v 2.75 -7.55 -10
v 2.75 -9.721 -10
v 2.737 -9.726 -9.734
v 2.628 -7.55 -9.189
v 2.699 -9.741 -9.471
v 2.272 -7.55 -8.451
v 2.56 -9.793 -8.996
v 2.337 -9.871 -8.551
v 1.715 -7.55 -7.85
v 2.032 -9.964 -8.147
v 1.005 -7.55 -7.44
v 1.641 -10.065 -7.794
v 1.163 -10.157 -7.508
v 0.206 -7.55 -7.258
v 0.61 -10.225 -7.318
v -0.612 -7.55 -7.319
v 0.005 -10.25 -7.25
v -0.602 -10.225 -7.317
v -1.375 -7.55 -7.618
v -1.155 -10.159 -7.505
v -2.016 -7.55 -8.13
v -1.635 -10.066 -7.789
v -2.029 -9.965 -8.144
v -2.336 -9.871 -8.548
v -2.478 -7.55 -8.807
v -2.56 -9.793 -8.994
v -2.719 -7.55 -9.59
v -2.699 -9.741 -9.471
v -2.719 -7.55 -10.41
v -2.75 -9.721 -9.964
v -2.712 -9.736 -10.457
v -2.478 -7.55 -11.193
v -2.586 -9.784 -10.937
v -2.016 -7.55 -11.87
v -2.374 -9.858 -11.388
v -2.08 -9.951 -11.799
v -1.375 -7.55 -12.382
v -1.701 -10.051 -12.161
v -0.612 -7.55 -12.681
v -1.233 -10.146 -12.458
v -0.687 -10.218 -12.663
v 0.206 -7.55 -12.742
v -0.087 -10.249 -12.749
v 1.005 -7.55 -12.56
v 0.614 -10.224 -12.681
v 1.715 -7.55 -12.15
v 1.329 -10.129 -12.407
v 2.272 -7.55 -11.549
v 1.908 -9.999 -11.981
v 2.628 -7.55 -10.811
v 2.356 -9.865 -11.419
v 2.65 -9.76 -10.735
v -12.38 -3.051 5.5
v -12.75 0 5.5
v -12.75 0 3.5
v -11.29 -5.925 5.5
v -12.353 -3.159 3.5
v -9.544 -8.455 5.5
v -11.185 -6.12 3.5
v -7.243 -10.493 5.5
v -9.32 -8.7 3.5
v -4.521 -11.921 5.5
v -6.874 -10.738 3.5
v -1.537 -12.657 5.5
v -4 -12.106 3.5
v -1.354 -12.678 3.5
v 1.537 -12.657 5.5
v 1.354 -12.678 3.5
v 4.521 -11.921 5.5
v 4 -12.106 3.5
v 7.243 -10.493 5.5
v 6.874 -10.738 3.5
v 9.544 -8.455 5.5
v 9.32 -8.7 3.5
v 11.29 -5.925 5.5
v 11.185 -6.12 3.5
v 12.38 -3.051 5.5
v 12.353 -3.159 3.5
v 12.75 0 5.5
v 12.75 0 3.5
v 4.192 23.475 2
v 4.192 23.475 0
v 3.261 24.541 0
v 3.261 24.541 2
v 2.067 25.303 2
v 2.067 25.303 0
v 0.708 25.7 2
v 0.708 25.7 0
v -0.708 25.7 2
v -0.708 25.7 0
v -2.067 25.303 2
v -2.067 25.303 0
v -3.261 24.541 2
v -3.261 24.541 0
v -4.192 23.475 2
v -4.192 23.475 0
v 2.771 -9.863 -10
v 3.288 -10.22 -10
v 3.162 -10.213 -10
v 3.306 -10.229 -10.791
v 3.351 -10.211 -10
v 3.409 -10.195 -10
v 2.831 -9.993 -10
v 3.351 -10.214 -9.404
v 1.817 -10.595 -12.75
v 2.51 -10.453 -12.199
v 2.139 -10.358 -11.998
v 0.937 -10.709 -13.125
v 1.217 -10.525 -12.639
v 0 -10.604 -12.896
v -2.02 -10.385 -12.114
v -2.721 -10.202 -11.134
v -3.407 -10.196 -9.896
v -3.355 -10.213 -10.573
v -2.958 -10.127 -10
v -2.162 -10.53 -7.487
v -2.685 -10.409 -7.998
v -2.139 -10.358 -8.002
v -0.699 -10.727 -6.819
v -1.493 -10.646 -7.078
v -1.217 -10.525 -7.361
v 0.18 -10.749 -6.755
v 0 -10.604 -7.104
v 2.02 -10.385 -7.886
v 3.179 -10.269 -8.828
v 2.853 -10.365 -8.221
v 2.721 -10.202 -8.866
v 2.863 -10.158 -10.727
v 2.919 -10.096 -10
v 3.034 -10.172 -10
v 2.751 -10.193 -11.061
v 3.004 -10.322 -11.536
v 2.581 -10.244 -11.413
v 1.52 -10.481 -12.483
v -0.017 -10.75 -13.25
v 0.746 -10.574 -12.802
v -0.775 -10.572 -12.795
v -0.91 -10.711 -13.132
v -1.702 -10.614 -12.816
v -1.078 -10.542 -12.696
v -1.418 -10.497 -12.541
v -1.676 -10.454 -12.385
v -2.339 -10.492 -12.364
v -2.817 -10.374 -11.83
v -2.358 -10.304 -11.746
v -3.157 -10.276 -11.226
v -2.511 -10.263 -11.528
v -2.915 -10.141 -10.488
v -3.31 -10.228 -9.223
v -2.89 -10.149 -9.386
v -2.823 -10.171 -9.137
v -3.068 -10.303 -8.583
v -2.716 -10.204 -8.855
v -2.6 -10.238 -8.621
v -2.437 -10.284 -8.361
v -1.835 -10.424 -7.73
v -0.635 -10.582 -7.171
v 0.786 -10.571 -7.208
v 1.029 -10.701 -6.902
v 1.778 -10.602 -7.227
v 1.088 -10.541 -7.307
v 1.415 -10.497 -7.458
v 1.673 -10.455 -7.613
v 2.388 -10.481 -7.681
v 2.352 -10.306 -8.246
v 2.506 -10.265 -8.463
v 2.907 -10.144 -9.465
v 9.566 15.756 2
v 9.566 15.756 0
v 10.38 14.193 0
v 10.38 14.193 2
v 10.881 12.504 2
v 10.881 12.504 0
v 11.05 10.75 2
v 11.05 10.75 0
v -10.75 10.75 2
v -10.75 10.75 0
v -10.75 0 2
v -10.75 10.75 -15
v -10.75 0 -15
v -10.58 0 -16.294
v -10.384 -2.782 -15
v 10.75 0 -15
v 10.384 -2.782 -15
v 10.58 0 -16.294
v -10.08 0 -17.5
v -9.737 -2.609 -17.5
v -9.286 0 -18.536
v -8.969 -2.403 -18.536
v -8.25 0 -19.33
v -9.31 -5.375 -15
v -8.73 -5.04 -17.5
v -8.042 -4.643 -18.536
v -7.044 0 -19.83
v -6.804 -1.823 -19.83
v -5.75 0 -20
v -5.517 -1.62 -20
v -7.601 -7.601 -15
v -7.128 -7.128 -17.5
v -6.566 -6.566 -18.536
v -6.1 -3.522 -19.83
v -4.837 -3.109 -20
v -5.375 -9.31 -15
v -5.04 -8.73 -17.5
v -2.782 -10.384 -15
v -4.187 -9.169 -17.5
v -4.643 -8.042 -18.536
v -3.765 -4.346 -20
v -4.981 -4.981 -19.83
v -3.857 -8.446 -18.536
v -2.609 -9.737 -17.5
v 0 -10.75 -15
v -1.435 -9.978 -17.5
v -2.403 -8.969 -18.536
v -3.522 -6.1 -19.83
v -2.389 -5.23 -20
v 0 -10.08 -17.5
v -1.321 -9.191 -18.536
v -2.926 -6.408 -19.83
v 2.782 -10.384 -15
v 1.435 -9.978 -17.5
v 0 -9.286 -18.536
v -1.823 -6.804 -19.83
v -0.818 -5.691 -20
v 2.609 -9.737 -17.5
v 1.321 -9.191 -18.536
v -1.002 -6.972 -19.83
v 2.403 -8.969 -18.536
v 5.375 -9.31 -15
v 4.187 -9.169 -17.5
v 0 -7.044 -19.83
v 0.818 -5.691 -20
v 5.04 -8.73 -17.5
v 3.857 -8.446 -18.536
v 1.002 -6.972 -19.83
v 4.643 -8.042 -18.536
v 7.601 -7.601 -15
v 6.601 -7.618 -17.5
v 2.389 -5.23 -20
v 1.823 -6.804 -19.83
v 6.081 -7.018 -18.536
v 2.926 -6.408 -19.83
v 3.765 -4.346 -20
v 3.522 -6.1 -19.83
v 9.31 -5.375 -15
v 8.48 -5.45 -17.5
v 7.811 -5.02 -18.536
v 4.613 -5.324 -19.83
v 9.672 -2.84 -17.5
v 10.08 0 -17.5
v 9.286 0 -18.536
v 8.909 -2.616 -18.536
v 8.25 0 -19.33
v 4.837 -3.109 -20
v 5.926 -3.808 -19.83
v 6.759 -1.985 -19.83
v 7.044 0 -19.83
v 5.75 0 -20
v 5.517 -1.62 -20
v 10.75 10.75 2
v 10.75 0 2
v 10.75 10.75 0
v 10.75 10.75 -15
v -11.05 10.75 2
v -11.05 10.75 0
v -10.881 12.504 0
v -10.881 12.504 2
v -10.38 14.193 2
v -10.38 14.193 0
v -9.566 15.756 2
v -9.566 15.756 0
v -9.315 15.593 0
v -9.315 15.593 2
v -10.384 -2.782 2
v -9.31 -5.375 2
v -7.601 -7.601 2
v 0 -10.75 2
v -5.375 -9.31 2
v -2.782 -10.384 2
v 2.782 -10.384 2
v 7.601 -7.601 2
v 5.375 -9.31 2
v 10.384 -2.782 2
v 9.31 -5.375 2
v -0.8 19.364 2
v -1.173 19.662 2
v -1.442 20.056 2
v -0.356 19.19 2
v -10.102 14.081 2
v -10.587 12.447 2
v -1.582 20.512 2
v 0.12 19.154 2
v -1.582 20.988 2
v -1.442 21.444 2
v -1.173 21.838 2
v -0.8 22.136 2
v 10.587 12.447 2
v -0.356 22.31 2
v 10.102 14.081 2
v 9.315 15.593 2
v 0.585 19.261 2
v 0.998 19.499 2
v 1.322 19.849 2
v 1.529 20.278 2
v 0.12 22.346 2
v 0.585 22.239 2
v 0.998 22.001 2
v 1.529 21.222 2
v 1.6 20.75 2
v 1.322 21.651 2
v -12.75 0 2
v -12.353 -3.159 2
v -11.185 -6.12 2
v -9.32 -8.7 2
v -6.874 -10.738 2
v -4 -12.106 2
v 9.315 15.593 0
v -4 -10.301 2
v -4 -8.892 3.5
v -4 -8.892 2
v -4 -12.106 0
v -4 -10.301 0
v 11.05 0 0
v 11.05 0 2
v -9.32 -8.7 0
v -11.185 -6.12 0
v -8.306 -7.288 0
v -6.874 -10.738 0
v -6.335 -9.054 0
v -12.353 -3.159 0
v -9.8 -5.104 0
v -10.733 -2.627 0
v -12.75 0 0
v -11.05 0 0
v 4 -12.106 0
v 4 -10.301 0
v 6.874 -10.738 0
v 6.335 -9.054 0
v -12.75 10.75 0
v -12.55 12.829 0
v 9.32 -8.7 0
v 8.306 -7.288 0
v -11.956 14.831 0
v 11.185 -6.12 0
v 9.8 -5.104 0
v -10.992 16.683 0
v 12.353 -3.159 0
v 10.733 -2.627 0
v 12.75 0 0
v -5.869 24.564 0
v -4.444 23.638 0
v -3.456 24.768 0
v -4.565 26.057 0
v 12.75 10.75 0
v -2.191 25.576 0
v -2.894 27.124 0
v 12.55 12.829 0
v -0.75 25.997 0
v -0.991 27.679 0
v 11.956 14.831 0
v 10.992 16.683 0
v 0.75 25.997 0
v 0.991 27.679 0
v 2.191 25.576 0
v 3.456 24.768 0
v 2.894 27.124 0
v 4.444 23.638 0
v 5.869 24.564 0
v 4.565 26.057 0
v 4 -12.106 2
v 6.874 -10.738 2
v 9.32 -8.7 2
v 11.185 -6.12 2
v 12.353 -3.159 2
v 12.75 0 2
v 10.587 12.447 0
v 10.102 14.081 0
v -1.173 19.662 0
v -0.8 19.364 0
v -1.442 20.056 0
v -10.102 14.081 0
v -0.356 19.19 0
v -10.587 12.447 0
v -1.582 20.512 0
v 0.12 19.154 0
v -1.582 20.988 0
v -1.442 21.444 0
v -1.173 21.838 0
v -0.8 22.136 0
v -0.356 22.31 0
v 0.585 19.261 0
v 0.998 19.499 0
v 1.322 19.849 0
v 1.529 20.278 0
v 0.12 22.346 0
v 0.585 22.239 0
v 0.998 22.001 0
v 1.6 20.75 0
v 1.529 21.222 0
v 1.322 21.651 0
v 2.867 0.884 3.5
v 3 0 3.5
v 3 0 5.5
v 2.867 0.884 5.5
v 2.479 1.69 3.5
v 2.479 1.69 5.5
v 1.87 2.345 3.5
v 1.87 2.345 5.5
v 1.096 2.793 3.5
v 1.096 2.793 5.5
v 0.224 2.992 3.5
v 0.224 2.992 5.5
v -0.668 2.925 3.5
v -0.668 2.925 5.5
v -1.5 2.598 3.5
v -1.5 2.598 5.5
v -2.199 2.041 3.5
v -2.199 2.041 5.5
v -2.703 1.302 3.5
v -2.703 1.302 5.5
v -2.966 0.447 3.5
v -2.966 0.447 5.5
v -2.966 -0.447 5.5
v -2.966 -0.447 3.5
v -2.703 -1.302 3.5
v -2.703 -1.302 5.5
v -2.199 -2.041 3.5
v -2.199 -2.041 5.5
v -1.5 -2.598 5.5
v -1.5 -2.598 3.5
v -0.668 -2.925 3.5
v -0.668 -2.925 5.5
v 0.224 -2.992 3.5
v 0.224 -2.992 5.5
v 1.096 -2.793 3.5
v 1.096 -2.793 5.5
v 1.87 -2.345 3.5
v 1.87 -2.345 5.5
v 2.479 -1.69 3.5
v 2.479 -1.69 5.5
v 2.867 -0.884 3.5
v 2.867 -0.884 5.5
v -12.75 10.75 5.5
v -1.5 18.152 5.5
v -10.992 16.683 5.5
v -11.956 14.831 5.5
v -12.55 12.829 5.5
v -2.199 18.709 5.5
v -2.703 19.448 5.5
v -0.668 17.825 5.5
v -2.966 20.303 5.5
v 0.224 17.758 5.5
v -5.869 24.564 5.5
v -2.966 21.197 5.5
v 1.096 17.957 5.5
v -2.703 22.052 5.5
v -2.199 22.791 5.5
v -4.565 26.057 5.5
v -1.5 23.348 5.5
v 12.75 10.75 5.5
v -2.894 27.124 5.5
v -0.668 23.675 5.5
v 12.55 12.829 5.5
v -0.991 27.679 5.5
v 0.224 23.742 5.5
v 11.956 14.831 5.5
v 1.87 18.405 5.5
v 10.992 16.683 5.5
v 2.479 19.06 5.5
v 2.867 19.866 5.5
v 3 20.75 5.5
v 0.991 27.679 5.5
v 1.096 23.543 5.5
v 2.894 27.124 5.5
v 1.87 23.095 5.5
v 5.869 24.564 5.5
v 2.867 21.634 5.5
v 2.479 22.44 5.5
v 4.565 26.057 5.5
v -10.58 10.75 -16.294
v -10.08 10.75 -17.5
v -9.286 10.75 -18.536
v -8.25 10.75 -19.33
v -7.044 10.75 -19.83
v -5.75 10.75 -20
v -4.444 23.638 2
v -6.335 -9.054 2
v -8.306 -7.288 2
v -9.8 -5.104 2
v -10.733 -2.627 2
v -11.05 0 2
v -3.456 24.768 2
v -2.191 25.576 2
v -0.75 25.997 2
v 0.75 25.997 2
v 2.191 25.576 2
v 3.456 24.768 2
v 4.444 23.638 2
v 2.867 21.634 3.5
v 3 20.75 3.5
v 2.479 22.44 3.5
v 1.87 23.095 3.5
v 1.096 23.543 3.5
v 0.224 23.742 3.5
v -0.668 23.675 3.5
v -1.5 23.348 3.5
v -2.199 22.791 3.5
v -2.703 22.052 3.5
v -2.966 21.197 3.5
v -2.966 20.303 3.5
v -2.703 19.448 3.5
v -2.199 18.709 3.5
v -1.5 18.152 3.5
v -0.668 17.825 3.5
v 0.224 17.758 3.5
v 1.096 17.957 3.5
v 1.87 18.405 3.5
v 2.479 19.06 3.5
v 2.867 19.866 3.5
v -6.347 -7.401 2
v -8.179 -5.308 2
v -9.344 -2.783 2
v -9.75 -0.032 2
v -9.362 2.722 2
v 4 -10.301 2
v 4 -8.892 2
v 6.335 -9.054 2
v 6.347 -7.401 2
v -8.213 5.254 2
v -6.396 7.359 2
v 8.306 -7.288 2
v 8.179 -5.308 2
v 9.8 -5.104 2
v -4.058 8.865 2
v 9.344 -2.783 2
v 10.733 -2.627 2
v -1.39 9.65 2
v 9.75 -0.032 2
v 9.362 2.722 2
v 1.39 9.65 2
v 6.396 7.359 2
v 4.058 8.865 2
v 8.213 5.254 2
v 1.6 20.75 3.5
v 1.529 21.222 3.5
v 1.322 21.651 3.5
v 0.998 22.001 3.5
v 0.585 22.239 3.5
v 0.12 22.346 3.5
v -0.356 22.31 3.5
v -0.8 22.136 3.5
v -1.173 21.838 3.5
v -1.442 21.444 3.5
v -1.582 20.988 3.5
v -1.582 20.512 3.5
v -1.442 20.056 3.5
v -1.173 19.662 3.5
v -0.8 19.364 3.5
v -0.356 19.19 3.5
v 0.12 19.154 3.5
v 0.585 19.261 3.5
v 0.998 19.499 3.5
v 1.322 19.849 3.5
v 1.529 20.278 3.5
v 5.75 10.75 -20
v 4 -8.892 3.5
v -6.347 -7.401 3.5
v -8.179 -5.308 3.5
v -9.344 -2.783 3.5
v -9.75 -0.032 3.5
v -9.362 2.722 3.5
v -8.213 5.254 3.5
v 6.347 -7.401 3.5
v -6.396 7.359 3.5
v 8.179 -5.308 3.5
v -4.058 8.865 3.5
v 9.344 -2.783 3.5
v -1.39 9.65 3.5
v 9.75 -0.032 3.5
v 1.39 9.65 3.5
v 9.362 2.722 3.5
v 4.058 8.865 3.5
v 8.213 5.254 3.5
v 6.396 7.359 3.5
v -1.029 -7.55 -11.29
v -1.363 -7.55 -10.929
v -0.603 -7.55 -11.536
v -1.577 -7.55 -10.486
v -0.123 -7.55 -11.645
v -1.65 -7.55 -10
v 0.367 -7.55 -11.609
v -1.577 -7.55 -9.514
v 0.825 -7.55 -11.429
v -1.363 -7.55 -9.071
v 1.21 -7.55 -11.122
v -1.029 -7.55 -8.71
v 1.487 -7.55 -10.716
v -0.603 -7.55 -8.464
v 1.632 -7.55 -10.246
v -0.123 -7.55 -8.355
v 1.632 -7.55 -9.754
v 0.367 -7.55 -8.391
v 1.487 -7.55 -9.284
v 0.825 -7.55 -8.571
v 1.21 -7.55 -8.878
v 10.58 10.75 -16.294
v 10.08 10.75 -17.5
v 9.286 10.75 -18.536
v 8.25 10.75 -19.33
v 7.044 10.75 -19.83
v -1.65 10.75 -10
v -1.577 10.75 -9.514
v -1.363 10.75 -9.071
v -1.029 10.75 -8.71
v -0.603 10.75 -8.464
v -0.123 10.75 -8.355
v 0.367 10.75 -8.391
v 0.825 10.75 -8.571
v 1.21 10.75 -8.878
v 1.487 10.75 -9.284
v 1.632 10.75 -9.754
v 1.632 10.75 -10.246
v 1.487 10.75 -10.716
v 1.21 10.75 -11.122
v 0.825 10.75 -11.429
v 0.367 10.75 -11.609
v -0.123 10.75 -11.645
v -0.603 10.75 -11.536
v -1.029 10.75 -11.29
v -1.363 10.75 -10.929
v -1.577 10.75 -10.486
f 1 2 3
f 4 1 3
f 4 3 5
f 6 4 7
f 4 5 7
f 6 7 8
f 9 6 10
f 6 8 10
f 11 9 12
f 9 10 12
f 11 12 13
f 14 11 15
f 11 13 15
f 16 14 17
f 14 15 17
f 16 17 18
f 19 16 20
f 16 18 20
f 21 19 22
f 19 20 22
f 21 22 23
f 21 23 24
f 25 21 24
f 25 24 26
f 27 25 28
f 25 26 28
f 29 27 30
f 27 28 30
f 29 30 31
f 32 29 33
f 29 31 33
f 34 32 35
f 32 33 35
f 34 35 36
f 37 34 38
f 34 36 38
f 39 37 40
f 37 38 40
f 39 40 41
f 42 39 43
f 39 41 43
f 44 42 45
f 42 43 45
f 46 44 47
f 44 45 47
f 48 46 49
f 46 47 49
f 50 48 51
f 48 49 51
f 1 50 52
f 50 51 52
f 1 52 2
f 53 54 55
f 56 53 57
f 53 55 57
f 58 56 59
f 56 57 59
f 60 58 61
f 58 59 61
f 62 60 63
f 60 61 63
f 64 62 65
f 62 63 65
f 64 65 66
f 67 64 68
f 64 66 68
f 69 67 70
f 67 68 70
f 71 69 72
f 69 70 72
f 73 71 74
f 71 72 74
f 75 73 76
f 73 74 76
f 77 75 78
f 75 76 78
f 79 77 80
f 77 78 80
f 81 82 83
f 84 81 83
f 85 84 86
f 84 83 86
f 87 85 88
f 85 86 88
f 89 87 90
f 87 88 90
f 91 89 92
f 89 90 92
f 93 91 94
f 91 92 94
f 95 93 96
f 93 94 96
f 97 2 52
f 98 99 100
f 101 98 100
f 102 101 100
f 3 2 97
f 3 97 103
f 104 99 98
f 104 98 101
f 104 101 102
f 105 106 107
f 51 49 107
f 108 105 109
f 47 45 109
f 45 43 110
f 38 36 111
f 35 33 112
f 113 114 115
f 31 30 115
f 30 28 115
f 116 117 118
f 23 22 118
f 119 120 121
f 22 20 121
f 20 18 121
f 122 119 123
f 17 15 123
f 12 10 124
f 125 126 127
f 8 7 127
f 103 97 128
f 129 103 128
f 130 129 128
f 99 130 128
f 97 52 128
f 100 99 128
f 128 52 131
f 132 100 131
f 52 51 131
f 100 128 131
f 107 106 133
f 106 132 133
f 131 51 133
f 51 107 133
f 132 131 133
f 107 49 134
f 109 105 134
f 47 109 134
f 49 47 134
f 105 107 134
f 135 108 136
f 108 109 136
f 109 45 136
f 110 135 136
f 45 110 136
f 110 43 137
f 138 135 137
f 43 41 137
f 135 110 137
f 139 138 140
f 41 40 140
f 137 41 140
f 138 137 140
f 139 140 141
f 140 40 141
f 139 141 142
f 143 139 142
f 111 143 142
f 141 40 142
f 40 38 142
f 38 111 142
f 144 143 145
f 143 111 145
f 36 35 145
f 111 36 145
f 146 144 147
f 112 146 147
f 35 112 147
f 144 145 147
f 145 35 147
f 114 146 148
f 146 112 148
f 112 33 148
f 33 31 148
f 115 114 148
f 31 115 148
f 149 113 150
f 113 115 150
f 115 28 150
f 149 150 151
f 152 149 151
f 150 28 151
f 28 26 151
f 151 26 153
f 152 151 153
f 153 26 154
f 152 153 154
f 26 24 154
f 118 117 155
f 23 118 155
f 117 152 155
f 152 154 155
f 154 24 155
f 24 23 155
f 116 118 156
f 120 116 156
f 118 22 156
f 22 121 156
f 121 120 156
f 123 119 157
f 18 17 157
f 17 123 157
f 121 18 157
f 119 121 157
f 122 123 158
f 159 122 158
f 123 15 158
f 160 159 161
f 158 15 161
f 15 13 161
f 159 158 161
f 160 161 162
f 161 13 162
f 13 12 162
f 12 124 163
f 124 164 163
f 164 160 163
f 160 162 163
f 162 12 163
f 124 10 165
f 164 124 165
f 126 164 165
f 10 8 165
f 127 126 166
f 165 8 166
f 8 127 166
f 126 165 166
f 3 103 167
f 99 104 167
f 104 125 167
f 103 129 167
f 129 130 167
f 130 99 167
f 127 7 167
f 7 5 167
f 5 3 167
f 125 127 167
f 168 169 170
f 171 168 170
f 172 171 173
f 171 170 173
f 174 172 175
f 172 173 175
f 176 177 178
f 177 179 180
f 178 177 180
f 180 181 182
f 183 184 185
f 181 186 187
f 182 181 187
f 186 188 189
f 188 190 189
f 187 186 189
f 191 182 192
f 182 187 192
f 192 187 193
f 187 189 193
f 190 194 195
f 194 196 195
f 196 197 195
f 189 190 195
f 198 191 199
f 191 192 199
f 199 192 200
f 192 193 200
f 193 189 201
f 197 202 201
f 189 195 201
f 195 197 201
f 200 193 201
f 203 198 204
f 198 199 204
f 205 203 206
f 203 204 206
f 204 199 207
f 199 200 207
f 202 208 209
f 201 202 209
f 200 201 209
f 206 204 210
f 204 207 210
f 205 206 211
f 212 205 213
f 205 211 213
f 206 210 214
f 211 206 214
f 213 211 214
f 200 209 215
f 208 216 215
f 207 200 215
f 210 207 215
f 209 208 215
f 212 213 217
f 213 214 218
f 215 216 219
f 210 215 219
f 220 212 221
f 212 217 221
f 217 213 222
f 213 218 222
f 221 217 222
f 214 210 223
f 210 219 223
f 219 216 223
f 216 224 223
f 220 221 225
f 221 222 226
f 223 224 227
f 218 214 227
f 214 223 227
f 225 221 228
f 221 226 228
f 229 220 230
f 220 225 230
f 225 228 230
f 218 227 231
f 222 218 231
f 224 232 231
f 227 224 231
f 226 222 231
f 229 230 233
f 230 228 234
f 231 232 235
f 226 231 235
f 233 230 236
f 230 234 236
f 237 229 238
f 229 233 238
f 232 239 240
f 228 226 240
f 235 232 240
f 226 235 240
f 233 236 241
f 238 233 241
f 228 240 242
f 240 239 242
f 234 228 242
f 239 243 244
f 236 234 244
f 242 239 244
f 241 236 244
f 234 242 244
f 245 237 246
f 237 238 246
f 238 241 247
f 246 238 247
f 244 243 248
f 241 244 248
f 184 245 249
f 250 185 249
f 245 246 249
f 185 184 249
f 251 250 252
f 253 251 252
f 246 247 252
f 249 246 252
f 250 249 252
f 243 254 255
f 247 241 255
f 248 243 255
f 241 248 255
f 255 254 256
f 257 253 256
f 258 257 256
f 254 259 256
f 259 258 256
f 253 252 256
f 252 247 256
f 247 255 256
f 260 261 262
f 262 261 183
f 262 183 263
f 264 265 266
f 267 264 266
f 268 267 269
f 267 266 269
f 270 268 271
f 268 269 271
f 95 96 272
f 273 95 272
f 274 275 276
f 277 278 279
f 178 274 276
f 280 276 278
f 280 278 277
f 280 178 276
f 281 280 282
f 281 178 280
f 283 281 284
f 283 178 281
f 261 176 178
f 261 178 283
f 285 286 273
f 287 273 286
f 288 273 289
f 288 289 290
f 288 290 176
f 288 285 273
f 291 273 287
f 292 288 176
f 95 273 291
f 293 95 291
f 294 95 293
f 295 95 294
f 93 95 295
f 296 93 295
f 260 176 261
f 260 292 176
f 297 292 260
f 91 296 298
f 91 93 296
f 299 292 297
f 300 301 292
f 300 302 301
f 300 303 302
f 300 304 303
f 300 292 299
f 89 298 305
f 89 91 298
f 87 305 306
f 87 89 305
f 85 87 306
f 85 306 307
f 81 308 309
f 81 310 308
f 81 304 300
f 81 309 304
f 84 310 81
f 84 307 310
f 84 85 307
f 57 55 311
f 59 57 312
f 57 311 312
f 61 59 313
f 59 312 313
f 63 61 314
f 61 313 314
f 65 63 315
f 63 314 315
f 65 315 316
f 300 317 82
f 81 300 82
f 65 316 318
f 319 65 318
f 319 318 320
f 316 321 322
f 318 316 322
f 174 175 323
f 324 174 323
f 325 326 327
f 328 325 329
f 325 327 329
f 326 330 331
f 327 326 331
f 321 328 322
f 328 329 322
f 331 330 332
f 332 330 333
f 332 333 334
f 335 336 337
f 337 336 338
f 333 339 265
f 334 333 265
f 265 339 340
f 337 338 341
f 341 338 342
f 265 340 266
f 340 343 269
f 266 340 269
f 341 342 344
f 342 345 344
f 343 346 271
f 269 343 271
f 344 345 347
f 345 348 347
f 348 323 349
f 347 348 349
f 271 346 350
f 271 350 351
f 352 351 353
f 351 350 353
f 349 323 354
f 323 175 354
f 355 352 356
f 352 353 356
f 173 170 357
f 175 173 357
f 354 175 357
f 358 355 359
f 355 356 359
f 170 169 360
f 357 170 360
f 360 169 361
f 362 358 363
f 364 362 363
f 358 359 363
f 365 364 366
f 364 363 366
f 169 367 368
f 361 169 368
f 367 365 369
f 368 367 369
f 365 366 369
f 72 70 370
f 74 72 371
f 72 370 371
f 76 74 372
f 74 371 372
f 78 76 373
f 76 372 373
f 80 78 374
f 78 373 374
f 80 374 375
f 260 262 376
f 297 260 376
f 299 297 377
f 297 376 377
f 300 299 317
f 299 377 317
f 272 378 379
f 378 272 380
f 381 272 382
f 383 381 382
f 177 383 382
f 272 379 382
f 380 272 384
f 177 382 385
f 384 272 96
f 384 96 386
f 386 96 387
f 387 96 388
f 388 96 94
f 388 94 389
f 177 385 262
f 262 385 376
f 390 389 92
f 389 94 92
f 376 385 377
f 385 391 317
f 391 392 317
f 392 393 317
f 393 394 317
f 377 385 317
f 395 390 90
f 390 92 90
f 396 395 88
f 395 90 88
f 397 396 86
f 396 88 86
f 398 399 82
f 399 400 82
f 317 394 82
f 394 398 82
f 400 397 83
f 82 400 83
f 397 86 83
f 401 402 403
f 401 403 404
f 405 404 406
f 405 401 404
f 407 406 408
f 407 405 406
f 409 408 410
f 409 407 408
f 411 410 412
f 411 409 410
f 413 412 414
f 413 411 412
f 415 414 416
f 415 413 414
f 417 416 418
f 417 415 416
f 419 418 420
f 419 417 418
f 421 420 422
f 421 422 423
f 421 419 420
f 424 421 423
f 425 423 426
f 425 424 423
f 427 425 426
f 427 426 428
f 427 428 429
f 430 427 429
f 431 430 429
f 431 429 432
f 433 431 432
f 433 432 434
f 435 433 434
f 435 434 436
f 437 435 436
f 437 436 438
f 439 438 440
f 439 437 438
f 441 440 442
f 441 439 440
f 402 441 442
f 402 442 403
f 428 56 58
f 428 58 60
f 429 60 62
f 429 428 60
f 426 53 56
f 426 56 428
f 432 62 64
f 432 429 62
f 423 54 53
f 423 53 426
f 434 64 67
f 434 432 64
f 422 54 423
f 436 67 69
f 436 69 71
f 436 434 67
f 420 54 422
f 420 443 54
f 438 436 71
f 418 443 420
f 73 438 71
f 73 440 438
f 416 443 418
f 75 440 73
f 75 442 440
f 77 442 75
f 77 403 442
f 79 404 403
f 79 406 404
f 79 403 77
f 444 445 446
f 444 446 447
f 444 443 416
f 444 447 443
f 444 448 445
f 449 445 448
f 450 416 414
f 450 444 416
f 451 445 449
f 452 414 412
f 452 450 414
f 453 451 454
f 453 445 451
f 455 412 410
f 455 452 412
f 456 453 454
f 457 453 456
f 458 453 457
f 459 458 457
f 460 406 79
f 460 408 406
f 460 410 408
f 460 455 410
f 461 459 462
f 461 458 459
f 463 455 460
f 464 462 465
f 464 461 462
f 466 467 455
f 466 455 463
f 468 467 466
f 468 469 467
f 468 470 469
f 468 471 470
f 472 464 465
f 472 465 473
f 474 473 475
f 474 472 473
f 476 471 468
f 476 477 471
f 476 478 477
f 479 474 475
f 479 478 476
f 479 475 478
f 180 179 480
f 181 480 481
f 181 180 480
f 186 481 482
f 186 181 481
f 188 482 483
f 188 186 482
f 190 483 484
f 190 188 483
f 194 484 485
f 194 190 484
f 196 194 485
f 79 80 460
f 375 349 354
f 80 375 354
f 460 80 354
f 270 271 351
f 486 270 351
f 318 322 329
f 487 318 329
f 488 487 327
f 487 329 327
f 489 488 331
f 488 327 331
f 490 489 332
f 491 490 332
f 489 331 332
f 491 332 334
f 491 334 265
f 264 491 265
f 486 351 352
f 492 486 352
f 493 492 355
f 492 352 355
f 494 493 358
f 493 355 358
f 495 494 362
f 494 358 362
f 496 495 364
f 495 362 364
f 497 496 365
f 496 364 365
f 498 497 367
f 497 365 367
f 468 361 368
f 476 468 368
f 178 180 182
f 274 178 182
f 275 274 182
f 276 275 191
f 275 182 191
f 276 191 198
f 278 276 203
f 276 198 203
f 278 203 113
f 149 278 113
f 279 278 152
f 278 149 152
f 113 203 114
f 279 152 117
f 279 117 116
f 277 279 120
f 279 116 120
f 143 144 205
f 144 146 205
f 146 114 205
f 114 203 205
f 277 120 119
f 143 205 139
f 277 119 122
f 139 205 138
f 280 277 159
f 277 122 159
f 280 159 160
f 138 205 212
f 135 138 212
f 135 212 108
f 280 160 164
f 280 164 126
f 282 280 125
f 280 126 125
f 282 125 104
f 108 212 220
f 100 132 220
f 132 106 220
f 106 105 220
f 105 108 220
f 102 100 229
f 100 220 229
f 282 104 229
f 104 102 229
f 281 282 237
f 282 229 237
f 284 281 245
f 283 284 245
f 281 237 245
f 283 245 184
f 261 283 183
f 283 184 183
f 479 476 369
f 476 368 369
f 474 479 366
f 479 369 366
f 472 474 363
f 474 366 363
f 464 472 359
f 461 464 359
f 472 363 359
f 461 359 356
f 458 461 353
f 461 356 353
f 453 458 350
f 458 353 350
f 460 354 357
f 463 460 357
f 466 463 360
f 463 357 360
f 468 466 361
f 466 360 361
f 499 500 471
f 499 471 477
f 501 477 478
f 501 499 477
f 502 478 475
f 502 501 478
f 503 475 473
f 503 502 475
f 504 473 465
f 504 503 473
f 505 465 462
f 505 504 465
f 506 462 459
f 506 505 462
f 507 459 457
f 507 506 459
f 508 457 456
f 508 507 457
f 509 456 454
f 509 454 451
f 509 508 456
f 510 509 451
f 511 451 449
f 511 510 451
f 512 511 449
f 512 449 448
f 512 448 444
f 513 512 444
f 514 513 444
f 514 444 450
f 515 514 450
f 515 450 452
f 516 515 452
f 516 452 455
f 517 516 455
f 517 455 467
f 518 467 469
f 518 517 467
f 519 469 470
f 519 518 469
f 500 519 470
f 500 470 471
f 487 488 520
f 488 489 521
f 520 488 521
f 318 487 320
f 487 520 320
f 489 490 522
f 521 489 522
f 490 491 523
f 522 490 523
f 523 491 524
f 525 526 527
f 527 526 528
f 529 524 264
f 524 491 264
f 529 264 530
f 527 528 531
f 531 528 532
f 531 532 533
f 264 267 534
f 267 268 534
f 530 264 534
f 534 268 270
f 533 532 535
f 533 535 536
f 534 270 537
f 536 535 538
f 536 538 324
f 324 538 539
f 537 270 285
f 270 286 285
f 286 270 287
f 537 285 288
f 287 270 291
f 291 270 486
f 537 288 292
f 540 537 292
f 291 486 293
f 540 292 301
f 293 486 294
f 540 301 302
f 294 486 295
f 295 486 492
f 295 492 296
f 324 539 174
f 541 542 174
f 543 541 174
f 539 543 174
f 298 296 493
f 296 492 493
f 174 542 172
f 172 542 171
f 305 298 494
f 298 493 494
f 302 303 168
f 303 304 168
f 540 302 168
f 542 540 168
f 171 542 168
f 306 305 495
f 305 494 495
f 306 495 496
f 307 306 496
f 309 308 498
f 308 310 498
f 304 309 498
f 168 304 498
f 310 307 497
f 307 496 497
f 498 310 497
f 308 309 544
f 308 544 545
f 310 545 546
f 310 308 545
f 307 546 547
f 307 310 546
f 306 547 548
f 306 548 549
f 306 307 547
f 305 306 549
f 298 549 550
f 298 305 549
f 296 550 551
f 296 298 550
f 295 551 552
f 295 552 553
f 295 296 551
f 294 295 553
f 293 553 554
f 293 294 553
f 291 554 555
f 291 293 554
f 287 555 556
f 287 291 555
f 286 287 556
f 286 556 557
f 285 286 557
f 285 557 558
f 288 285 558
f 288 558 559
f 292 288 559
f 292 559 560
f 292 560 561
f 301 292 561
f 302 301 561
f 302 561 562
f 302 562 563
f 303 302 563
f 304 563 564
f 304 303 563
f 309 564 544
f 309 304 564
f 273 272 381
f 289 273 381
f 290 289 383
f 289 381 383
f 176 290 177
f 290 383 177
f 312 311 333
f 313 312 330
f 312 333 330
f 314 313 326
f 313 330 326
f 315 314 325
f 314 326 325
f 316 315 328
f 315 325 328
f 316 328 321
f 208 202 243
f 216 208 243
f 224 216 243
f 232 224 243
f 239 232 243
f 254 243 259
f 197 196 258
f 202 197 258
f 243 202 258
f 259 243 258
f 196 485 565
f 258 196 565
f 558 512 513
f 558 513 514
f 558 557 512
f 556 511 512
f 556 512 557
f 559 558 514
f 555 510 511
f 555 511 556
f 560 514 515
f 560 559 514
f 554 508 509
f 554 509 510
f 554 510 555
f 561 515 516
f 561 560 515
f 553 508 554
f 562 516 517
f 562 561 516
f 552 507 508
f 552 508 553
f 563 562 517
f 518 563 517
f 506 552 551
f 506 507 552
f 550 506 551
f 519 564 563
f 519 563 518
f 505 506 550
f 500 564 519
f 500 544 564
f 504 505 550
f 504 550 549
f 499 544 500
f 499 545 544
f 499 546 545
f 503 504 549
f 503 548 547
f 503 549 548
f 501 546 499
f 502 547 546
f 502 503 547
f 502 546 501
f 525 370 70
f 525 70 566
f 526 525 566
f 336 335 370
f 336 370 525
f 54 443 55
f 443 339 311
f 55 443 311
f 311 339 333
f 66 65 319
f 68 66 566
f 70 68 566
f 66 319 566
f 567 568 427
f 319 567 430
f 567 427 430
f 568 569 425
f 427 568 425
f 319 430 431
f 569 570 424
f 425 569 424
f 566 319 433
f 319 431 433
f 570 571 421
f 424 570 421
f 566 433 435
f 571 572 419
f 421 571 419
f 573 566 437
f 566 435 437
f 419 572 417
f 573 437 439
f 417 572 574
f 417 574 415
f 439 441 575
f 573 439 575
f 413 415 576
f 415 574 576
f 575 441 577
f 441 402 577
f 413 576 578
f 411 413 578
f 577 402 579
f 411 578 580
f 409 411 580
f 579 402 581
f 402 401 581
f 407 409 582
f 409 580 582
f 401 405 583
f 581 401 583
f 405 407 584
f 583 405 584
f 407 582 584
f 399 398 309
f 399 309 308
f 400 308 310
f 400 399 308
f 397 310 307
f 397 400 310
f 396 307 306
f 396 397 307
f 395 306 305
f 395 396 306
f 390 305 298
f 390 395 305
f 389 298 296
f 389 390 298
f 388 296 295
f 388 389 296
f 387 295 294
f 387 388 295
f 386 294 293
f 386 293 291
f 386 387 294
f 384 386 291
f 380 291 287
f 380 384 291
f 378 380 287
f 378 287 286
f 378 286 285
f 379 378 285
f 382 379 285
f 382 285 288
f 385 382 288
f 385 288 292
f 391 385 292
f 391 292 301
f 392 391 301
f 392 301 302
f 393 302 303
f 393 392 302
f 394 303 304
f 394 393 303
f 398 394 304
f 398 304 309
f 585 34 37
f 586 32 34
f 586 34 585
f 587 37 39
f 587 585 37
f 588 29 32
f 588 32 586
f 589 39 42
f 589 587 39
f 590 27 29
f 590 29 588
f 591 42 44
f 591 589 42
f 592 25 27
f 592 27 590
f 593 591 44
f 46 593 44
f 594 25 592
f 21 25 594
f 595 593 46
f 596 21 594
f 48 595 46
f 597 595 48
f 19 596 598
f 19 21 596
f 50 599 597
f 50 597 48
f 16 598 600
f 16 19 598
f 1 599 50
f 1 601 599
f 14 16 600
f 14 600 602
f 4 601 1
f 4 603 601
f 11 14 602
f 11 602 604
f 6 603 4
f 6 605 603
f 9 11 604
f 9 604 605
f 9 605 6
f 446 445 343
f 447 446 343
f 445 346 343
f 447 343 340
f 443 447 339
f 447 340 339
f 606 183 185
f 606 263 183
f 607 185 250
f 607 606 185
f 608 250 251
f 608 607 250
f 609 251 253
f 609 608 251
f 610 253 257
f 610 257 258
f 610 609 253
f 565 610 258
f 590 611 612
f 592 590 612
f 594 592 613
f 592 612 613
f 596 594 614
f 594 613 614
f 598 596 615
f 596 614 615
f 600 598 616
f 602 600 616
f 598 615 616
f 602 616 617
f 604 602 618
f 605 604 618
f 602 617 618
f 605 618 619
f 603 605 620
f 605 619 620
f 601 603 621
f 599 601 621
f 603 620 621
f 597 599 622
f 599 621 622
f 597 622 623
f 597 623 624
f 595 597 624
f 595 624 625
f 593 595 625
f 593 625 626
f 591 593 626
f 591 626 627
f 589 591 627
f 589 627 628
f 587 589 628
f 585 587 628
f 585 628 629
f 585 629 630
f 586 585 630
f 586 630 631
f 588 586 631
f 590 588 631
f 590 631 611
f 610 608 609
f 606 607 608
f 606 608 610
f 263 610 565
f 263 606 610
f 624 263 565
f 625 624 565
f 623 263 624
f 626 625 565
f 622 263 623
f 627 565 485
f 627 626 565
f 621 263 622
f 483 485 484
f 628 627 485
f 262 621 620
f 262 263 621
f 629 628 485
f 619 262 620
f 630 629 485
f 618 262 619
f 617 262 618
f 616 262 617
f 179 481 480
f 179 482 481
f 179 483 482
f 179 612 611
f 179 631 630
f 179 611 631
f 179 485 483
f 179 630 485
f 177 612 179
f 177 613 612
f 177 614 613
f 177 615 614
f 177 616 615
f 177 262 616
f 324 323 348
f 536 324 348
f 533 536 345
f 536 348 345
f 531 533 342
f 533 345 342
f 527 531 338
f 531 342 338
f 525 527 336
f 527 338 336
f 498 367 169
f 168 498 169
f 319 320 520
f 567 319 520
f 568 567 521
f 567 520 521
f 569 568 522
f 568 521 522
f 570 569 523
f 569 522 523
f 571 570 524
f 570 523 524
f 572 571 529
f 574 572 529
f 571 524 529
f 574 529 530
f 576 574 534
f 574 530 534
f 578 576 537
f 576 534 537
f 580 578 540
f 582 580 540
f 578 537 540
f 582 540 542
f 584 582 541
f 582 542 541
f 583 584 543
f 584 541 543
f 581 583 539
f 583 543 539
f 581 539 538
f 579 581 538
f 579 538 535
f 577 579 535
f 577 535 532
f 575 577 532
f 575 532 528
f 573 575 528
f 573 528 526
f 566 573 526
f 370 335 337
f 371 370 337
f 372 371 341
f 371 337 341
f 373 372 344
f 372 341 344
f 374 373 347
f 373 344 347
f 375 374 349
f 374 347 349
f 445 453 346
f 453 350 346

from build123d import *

# Parameters (mm, degrees)
F1_DEPTH  = 20
F2_R      = 1.6
F3_DEPTH  = 2
F4_R      = 1.65
F5_DEPTH  = 30
F8_R      = 2.75
F9_DEPTH  = 3.2
F10_R     = 0.5
F11_R     = 5
F13_DEPTH = 2
F14_R     = 1.6
F15_DEPTH = 1.5
F16_R     = 3
F17_DEPTH = 2
F18_W     = 8
F18_H     = 4.8582903781
F19_DEPTH = 2


# Not quite as in the source:
# - a feature names something its author has since deleted; it is built from what else it names


with BuildPart() as f1:
    # F0 (on Top) → F1 (new body)
    with BuildSketch(Plane.XY):
        with BuildLine():
            Line((10.75, 10.75), (-10.75, 10.75))
            Line((-10.75, 10.75), (-10.75, 0))
            ThreePointArc((-10.75, 0), (0, -10.75), (10.75, 0))
            Line((10.75, 0), (10.75, 10.75))
        make_face()
    extrude(amount=-F1_DEPTH)

    # F2 (on face) → F3 (join)
    with BuildSketch(Plane.XY):
        with BuildLine():
            Line((-10.75, 10.75), (-10.75, 0))
            ThreePointArc((-10.75, 0), (0, -10.75), (10.75, 0))
            Line((10.75, 0), (10.75, 10.75))
            ThreePointArc((10.75, 10.75), (10.383601773, 13.2755372984), (9.3146181955, 15.5928332263))
            Line((9.3146181955, 15.5928332263), (4.1924539291, 23.4745788761))
            ThreePointArc((4.1924539291, 23.4745788761), (0, 25.75), (-4.1924539291, 23.4745788761))
            Line((-4.1924539291, 23.4745788761), (-9.3146181955, 15.5928332263))
            ThreePointArc((-9.3146181955, 15.5928332263), (-10.383601773, 13.2755372984), (-10.75, 10.75))
        make_face()
        with Locations((0, 20.75)):
            Circle(F2_R, mode=Mode.SUBTRACT)
    extrude(amount=F3_DEPTH)

    # F4 (on face) → F5 (cut)
    with BuildSketch(Plane(origin=(0, 10.75, 0), x_dir=(-1, 0, 0), z_dir=(0, 1, 0))):
        with Locations((0, -10)):
            Circle(F4_R)
    extrude(amount=-F5_DEPTH, mode=Mode.SUBTRACT)

    # F8 (on plane+point) → F9 (cut)
    with BuildSketch(Plane.XZ.offset(10.75)):
        with Locations((0, -10)):
            Circle(F8_R)
    extrude(amount=-F9_DEPTH, mode=Mode.SUBTRACT)

    # F10
    f10_edges = [f1.edges().sort_by_distance(p)[0] for p in [
        (-2.749989, -10.392308, -9.992207),
    ]]
    fillet(f10_edges, radius=F10_R)

    # F11
    f11_edges = [f1.edges().sort_by_distance(p)[0] for p in [
        (0, -10.75, -20),
        (10.75, 5.375, -20),
        (-10.75, 5.375, -20),
    ]]
    fillet(f11_edges, radius=F11_R)


with BuildPart() as f13:
    # F12 (on Top) → F13 (new body)
    with BuildSketch(Plane.XY):
        with BuildLine():
            Line((-12.75, 10.75), (-12.75, 0))
            ThreePointArc((-12.75, 0), (0, -12.75), (12.75, 0))
            Line((12.75, 0), (12.75, 10.75))
            ThreePointArc((12.75, 10.75), (12.3011474886, 13.8438844004), (10.9915997671, 16.6826647767))
            Line((10.9915997671, 16.6826647767), (5.8694355008, 24.5644104265))
            ThreePointArc((5.8694355008, 24.5644104265), (0, 27.75), (-5.8694355008, 24.5644104265))
            Line((-5.8694355008, 24.5644104265), (-10.9915997671, 16.6826647767))
            ThreePointArc((-10.9915997671, 16.6826647767), (-12.3011474886, 13.8438844004), (-12.75, 10.75))
        make_face()
        with BuildLine():
            ThreePointArc((11.05, 0), (0, -11.05), (-11.05, 0))
            Line((-11.05, 0), (-11.05, 10.75))
            ThreePointArc((-11.05, 10.75), (-10.6712336303, 13.3607893637), (-9.5661654312, 15.7563079588))
            Line((-9.5661654312, 15.7563079588), (-4.4440011649, 23.6380536087))
            ThreePointArc((-4.4440011649, 23.6380536087), (0, 26.05), (4.4440011649, 23.6380536087))
            Line((4.4440011649, 23.6380536087), (9.5661654312, 15.7563079588))
            ThreePointArc((9.5661654312, 15.7563079588), (10.6712336303, 13.3607893637), (11.05, 10.75))
            Line((11.05, 10.75), (11.05, 0))
        make_face(mode=Mode.SUBTRACT)
    extrude(amount=F13_DEPTH)

    # F14 (on face) → F15 (join)
    with BuildSketch(Plane.XY.offset(2)):
        with BuildLine():
            Line((10.9915997671, 16.6826647767), (5.8694355008, 24.5644104265))
            ThreePointArc((5.8694355008, 24.5644104265), (0, 27.75), (-5.8694355008, 24.5644104265))
            Line((-5.8694355008, 24.5644104265), (-10.9915997671, 16.6826647767))
            ThreePointArc((-10.9915997671, 16.6826647767), (-12.3011474886, 13.8438844004), (-12.75, 10.75))
            Line((-12.75, 10.75), (-12.75, 0))
            ThreePointArc((-12.75, 0), (-10.3335013427, -7.4686846231), (-4, -12.1063000128))
            Line((-4, -12.1063000128), (-4, -8.8917096219))
            ThreePointArc((-4, -8.8917096219), (0, 9.75), (4, -8.8917096219))
            Line((4, -8.8917096219), (4, -12.1063000128))
            ThreePointArc((4, -12.1063000128), (10.3335013427, -7.4686846231), (12.75, 0))
            Line((12.75, 0), (12.75, 10.75))
            ThreePointArc((12.75, 10.75), (12.3011474886, 13.8438844004), (10.9915997671, 16.6826647767))
        make_face()
        with Locations((0, 20.75)):
            Circle(F14_R, mode=Mode.SUBTRACT)
    extrude(amount=F15_DEPTH)

    # F16 (on face) → F17 (join)
    with BuildSketch(Plane.XY.offset(3.5)):
        with BuildLine():
            Line((10.9915997671, 16.6826647767), (5.8694355008, 24.5644104265))
            ThreePointArc((5.8694355008, 24.5644104265), (0, 27.75), (-5.8694355008, 24.5644104265))
            Line((-5.8694355008, 24.5644104265), (-10.9915997671, 16.6826647767))
            ThreePointArc((-10.9915997671, 16.6826647767), (-12.3011474886, 13.8438844004), (-12.75, 10.75))
            Line((-12.75, 10.75), (-12.75, 0))
            ThreePointArc((-12.75, 0), (0, -12.75), (12.75, 0))
            Line((12.75, 0), (12.75, 10.75))
            ThreePointArc((12.75, 10.75), (12.3011474886, 13.8438844004), (10.9915997671, 16.6826647767))
        make_face()
        Circle(F16_R, mode=Mode.SUBTRACT)
        with Locations((0, 20.75)):
            Circle(F16_R, mode=Mode.SUBTRACT)
    extrude(amount=F17_DEPTH)

    # F18 (on face) → F19 (cut, through all)
    with BuildSketch(Plane.XY):
        with Locations((0, -11.3208548109)):
            Rectangle(F18_W, F18_H)
    extrude(amount=F19_DEPTH, mode=Mode.SUBTRACT)


solid = Compound([f1.part, f13.part])
